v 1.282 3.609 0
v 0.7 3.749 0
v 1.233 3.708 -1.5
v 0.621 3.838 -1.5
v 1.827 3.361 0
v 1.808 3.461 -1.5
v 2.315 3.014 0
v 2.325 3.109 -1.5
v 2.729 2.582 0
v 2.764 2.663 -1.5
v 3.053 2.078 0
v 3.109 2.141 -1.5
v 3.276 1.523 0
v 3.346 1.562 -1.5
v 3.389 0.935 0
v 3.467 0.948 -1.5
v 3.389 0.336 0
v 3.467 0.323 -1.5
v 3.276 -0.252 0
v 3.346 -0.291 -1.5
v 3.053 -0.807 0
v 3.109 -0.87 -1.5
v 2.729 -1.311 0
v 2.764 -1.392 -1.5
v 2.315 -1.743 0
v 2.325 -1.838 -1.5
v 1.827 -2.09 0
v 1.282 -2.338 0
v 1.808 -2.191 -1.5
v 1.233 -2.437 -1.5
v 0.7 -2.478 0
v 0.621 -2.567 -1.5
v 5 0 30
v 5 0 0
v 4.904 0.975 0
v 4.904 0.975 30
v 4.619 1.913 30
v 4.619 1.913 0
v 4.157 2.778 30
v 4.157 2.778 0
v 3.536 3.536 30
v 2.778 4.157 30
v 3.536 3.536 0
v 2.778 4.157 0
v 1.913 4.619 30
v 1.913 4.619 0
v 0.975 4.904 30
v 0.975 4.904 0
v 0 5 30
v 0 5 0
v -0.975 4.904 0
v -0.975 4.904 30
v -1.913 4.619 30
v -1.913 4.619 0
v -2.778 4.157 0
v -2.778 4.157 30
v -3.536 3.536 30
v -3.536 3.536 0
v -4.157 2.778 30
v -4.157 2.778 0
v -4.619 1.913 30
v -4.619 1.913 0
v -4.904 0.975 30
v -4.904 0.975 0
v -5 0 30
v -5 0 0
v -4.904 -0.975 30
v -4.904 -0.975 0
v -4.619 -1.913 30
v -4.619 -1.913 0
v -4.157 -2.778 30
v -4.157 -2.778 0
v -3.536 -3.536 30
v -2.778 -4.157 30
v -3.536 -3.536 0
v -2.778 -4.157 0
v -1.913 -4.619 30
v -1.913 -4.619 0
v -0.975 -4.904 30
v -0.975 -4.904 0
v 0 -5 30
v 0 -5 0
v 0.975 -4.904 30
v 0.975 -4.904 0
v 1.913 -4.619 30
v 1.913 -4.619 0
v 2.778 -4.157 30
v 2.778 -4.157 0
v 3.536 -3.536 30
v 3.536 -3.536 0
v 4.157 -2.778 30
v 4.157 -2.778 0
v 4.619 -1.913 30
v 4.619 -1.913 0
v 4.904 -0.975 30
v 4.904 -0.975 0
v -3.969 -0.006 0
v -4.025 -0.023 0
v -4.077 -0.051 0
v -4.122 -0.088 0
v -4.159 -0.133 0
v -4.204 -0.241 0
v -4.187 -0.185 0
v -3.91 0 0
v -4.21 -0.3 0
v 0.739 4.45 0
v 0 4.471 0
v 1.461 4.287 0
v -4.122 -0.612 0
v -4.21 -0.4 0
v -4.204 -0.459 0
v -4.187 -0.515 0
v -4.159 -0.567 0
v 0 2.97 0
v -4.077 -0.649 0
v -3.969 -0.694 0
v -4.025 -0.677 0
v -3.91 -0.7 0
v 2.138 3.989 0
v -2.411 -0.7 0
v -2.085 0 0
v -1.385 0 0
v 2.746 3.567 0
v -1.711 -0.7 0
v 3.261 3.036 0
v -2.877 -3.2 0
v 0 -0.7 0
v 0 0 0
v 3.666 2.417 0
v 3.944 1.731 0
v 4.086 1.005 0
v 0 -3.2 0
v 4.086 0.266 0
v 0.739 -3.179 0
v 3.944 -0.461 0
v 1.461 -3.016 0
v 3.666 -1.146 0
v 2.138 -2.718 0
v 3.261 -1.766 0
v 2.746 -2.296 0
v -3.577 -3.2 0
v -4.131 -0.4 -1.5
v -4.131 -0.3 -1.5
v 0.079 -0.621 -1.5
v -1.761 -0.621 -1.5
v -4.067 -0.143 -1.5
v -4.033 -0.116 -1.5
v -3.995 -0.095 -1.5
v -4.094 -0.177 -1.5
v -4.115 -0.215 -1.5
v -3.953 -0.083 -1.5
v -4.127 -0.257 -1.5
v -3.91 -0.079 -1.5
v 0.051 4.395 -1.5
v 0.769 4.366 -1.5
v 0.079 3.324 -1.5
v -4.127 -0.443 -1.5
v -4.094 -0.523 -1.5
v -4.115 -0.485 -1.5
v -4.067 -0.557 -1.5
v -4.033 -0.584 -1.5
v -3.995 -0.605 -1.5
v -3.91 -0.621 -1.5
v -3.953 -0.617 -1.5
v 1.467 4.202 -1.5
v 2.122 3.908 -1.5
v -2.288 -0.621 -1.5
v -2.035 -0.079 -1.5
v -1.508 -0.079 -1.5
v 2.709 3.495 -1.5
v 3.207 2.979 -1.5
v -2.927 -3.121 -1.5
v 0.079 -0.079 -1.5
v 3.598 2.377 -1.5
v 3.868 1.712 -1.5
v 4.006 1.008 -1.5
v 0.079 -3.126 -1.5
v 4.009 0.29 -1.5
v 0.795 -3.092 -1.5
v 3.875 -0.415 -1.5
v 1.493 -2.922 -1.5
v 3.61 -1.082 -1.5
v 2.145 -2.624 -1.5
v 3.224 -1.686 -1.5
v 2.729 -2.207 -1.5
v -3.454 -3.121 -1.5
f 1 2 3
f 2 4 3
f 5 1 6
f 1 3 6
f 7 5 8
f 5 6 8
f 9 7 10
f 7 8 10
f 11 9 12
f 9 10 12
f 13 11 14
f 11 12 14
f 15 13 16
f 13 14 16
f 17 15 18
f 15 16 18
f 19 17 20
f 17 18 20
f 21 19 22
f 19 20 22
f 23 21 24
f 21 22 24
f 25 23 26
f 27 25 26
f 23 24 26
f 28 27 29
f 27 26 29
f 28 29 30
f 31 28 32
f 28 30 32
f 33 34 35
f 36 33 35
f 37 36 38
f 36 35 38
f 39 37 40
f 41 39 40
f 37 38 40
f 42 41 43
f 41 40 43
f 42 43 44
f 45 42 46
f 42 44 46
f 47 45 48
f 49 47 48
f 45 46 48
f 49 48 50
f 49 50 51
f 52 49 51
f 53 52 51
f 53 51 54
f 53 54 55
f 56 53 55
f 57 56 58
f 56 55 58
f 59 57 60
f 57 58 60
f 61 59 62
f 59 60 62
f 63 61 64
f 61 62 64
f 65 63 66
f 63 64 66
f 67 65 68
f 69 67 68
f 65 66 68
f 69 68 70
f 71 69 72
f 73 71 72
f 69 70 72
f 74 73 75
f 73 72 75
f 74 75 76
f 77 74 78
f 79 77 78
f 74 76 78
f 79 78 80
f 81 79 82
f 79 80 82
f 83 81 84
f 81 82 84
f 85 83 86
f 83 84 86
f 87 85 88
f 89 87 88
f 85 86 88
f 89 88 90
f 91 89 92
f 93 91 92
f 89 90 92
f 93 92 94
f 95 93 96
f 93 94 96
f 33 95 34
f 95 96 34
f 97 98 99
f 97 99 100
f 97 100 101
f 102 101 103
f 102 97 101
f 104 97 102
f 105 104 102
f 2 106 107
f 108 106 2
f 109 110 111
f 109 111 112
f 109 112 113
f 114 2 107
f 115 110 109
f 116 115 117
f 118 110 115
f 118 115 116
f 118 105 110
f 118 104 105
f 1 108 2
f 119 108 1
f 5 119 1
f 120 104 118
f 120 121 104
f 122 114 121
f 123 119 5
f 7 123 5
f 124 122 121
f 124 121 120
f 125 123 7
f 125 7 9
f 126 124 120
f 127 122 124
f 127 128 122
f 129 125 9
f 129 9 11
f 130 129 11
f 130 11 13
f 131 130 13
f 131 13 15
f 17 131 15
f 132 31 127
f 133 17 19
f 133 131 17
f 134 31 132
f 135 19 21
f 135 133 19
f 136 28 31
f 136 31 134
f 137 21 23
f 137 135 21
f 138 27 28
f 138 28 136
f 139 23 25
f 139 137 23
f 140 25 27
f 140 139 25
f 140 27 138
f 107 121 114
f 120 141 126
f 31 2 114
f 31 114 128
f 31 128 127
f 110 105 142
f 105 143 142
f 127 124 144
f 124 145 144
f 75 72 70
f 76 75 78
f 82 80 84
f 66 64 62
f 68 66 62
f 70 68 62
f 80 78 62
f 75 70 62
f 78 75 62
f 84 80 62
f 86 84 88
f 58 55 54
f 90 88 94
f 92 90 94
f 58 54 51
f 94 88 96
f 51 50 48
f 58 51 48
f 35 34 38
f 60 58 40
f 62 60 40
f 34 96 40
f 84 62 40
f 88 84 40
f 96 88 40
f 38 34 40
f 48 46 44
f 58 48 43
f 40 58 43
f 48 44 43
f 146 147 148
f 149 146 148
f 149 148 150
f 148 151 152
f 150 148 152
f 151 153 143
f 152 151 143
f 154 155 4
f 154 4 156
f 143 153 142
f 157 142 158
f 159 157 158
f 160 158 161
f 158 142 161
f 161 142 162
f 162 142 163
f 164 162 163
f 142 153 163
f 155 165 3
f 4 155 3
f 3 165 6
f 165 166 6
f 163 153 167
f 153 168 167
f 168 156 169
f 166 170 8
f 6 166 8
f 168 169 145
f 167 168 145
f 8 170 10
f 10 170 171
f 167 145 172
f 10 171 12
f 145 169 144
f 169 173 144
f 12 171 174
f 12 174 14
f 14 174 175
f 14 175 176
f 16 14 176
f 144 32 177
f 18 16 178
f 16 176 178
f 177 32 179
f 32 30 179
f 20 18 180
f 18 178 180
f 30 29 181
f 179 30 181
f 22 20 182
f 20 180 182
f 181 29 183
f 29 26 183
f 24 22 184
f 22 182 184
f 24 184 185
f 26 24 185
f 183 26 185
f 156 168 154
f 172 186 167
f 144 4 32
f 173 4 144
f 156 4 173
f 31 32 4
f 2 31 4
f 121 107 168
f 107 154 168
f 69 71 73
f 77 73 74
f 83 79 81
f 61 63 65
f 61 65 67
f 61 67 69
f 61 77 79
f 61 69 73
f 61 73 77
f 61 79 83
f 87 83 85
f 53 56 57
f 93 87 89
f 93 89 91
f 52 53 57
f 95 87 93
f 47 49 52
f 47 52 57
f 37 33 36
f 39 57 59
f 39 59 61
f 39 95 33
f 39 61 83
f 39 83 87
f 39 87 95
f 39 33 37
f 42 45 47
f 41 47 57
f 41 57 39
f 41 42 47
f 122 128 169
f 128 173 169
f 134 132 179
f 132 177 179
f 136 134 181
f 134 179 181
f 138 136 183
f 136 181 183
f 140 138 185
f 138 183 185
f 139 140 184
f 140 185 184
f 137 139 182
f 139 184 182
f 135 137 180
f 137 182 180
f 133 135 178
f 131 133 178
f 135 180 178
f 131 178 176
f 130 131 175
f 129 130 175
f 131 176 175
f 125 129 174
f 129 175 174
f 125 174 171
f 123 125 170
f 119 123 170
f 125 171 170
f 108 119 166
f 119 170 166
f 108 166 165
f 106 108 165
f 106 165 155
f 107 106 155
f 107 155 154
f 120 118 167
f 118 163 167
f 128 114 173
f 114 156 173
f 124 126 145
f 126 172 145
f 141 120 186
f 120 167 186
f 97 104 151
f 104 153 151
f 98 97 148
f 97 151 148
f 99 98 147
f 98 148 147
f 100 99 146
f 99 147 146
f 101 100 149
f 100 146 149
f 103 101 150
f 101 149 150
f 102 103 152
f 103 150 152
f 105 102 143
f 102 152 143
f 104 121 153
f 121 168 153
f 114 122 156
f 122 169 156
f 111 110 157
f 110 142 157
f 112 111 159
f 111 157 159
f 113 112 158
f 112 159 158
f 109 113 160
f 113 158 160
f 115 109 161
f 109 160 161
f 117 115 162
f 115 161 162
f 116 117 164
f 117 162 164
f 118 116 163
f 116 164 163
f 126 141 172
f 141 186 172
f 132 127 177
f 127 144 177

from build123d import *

# Parameters (mm, degrees)
F1_DEPTH = 1.5
F1_TAPER = 3
F0_R     = 5
F2_DEPTH = 30


with BuildPart() as f1:
    # F0 (on Top) → F1 (new body)
    with BuildSketch(Plane.XY):
        with BuildLine():
            ThreePointArc((0, -3.2), (4.103420501, 0.6354360376), (0, 4.4708720751))
            Line((0, 4.4708720751), (-2.0848018873, 0))
            Line((-2.0848018873, 0), (-3.9100516587, 0))
            ThreePointArc((-3.9100516587, 0), (-4.1221836931, -0.0878679656), (-4.2100516587, -0.3))
            Line((-4.2100516587, -0.3), (-4.2100516587, -0.4))
            ThreePointArc((-4.2100516587, -0.4), (-4.1221836931, -0.6121320344), (-3.9100516587, -0.7))
            Line((-3.9100516587, -0.7), (-2.411217248, -0.7))
            Line((-2.411217248, -0.7), (-3.5769863934, -3.2))
            Line((-3.5769863934, -3.2), (-2.8769863934, -3.2))
            Line((-2.8769863934, -3.2), (-1.711217248, -0.7))
            Line((-1.711217248, -0.7), (0, -0.7))
            Line((0, -0.7), (0, -3.2))
        make_face()
        Polygon((0, 0), (-1.3848018873, 0), (0, 2.9697172308), align=None, mode=Mode.SUBTRACT)
        with BuildLine():
            Line((0.7, -2.4777031195), (0.7, 3.7485751946))
            ThreePointArc((0.7, 3.7485751946), (3.403420501, 0.6354360376), (0.7, -2.4777031195))
        make_face(mode=Mode.SUBTRACT)
    extrude(amount=-F1_DEPTH, taper=F1_TAPER)


with BuildPart() as f2:
    # F0 (on Top) → F2 (new body)
    with BuildSketch(Plane.XY):
        Circle(F0_R)
        with BuildLine():
            Line((-2.0848018873, 0), (0, 4.4708720751))
            ThreePointArc((0, 4.4708720751), (4.103420501, 0.6354360376), (0, -3.2))
            Line((0, -3.2), (0, -0.7))
            Line((0, -0.7), (-1.711217248, -0.7))
            Line((-1.711217248, -0.7), (-2.8769863934, -3.2))
            Line((-2.8769863934, -3.2), (-3.5769863934, -3.2))
            Line((-3.5769863934, -3.2), (-2.411217248, -0.7))
            Line((-2.411217248, -0.7), (-3.9100516587, -0.7))
            ThreePointArc((-3.9100516587, -0.7), (-4.1221836931, -0.6121320344), (-4.2100516587, -0.4))
            Line((-4.2100516587, -0.4), (-4.2100516587, -0.3))
            ThreePointArc((-4.2100516587, -0.3), (-4.1221836931, -0.0878679656), (-3.9100516587, 0))
            Line((-3.9100516587, 0), (-2.0848018873, 0))
        make_face(mode=Mode.SUBTRACT)
        with BuildLine():
            ThreePointArc((0, -3.2), (4.103420501, 0.6354360376), (0, 4.4708720751))
            Line((0, 4.4708720751), (-2.0848018873, 0))
            Line((-2.0848018873, 0), (-3.9100516587, 0))
            ThreePointArc((-3.9100516587, 0), (-4.1221836931, -0.0878679656), (-4.2100516587, -0.3))
            Line((-4.2100516587, -0.3), (-4.2100516587, -0.4))
            ThreePointArc((-4.2100516587, -0.4), (-4.1221836931, -0.6121320344), (-3.9100516587, -0.7))
            Line((-3.9100516587, -0.7), (-2.411217248, -0.7))
            Line((-2.411217248, -0.7), (-3.5769863934, -3.2))
            Line((-3.5769863934, -3.2), (-2.8769863934, -3.2))
            Line((-2.8769863934, -3.2), (-1.711217248, -0.7))
            Line((-1.711217248, -0.7), (0, -0.7))
            Line((0, -0.7), (0, -3.2))
        make_face()
        Polygon((0, 0), (-1.3848018873, 0), (0, 2.9697172308), align=None, mode=Mode.SUBTRACT)
        with BuildLine():
            Line((0.7, -2.4777031195), (0.7, 3.7485751946))
            ThreePointArc((0.7, 3.7485751946), (3.403420501, 0.6354360376), (0.7, -2.4777031195))
        make_face(mode=Mode.SUBTRACT)
        Polygon((0, 2.9697172308), (-1.3848018873, 0), (0, 0), align=None)
        with BuildLine():
            ThreePointArc((0.7, -2.4777031195), (3.403420501, 0.6354360376), (0.7, 3.7485751946))
            Line((0.7, 3.7485751946), (0.7, -2.4777031195))
        make_face()
    extrude(amount=F2_DEPTH)


solid = Compound([f1.part, f2.part])
